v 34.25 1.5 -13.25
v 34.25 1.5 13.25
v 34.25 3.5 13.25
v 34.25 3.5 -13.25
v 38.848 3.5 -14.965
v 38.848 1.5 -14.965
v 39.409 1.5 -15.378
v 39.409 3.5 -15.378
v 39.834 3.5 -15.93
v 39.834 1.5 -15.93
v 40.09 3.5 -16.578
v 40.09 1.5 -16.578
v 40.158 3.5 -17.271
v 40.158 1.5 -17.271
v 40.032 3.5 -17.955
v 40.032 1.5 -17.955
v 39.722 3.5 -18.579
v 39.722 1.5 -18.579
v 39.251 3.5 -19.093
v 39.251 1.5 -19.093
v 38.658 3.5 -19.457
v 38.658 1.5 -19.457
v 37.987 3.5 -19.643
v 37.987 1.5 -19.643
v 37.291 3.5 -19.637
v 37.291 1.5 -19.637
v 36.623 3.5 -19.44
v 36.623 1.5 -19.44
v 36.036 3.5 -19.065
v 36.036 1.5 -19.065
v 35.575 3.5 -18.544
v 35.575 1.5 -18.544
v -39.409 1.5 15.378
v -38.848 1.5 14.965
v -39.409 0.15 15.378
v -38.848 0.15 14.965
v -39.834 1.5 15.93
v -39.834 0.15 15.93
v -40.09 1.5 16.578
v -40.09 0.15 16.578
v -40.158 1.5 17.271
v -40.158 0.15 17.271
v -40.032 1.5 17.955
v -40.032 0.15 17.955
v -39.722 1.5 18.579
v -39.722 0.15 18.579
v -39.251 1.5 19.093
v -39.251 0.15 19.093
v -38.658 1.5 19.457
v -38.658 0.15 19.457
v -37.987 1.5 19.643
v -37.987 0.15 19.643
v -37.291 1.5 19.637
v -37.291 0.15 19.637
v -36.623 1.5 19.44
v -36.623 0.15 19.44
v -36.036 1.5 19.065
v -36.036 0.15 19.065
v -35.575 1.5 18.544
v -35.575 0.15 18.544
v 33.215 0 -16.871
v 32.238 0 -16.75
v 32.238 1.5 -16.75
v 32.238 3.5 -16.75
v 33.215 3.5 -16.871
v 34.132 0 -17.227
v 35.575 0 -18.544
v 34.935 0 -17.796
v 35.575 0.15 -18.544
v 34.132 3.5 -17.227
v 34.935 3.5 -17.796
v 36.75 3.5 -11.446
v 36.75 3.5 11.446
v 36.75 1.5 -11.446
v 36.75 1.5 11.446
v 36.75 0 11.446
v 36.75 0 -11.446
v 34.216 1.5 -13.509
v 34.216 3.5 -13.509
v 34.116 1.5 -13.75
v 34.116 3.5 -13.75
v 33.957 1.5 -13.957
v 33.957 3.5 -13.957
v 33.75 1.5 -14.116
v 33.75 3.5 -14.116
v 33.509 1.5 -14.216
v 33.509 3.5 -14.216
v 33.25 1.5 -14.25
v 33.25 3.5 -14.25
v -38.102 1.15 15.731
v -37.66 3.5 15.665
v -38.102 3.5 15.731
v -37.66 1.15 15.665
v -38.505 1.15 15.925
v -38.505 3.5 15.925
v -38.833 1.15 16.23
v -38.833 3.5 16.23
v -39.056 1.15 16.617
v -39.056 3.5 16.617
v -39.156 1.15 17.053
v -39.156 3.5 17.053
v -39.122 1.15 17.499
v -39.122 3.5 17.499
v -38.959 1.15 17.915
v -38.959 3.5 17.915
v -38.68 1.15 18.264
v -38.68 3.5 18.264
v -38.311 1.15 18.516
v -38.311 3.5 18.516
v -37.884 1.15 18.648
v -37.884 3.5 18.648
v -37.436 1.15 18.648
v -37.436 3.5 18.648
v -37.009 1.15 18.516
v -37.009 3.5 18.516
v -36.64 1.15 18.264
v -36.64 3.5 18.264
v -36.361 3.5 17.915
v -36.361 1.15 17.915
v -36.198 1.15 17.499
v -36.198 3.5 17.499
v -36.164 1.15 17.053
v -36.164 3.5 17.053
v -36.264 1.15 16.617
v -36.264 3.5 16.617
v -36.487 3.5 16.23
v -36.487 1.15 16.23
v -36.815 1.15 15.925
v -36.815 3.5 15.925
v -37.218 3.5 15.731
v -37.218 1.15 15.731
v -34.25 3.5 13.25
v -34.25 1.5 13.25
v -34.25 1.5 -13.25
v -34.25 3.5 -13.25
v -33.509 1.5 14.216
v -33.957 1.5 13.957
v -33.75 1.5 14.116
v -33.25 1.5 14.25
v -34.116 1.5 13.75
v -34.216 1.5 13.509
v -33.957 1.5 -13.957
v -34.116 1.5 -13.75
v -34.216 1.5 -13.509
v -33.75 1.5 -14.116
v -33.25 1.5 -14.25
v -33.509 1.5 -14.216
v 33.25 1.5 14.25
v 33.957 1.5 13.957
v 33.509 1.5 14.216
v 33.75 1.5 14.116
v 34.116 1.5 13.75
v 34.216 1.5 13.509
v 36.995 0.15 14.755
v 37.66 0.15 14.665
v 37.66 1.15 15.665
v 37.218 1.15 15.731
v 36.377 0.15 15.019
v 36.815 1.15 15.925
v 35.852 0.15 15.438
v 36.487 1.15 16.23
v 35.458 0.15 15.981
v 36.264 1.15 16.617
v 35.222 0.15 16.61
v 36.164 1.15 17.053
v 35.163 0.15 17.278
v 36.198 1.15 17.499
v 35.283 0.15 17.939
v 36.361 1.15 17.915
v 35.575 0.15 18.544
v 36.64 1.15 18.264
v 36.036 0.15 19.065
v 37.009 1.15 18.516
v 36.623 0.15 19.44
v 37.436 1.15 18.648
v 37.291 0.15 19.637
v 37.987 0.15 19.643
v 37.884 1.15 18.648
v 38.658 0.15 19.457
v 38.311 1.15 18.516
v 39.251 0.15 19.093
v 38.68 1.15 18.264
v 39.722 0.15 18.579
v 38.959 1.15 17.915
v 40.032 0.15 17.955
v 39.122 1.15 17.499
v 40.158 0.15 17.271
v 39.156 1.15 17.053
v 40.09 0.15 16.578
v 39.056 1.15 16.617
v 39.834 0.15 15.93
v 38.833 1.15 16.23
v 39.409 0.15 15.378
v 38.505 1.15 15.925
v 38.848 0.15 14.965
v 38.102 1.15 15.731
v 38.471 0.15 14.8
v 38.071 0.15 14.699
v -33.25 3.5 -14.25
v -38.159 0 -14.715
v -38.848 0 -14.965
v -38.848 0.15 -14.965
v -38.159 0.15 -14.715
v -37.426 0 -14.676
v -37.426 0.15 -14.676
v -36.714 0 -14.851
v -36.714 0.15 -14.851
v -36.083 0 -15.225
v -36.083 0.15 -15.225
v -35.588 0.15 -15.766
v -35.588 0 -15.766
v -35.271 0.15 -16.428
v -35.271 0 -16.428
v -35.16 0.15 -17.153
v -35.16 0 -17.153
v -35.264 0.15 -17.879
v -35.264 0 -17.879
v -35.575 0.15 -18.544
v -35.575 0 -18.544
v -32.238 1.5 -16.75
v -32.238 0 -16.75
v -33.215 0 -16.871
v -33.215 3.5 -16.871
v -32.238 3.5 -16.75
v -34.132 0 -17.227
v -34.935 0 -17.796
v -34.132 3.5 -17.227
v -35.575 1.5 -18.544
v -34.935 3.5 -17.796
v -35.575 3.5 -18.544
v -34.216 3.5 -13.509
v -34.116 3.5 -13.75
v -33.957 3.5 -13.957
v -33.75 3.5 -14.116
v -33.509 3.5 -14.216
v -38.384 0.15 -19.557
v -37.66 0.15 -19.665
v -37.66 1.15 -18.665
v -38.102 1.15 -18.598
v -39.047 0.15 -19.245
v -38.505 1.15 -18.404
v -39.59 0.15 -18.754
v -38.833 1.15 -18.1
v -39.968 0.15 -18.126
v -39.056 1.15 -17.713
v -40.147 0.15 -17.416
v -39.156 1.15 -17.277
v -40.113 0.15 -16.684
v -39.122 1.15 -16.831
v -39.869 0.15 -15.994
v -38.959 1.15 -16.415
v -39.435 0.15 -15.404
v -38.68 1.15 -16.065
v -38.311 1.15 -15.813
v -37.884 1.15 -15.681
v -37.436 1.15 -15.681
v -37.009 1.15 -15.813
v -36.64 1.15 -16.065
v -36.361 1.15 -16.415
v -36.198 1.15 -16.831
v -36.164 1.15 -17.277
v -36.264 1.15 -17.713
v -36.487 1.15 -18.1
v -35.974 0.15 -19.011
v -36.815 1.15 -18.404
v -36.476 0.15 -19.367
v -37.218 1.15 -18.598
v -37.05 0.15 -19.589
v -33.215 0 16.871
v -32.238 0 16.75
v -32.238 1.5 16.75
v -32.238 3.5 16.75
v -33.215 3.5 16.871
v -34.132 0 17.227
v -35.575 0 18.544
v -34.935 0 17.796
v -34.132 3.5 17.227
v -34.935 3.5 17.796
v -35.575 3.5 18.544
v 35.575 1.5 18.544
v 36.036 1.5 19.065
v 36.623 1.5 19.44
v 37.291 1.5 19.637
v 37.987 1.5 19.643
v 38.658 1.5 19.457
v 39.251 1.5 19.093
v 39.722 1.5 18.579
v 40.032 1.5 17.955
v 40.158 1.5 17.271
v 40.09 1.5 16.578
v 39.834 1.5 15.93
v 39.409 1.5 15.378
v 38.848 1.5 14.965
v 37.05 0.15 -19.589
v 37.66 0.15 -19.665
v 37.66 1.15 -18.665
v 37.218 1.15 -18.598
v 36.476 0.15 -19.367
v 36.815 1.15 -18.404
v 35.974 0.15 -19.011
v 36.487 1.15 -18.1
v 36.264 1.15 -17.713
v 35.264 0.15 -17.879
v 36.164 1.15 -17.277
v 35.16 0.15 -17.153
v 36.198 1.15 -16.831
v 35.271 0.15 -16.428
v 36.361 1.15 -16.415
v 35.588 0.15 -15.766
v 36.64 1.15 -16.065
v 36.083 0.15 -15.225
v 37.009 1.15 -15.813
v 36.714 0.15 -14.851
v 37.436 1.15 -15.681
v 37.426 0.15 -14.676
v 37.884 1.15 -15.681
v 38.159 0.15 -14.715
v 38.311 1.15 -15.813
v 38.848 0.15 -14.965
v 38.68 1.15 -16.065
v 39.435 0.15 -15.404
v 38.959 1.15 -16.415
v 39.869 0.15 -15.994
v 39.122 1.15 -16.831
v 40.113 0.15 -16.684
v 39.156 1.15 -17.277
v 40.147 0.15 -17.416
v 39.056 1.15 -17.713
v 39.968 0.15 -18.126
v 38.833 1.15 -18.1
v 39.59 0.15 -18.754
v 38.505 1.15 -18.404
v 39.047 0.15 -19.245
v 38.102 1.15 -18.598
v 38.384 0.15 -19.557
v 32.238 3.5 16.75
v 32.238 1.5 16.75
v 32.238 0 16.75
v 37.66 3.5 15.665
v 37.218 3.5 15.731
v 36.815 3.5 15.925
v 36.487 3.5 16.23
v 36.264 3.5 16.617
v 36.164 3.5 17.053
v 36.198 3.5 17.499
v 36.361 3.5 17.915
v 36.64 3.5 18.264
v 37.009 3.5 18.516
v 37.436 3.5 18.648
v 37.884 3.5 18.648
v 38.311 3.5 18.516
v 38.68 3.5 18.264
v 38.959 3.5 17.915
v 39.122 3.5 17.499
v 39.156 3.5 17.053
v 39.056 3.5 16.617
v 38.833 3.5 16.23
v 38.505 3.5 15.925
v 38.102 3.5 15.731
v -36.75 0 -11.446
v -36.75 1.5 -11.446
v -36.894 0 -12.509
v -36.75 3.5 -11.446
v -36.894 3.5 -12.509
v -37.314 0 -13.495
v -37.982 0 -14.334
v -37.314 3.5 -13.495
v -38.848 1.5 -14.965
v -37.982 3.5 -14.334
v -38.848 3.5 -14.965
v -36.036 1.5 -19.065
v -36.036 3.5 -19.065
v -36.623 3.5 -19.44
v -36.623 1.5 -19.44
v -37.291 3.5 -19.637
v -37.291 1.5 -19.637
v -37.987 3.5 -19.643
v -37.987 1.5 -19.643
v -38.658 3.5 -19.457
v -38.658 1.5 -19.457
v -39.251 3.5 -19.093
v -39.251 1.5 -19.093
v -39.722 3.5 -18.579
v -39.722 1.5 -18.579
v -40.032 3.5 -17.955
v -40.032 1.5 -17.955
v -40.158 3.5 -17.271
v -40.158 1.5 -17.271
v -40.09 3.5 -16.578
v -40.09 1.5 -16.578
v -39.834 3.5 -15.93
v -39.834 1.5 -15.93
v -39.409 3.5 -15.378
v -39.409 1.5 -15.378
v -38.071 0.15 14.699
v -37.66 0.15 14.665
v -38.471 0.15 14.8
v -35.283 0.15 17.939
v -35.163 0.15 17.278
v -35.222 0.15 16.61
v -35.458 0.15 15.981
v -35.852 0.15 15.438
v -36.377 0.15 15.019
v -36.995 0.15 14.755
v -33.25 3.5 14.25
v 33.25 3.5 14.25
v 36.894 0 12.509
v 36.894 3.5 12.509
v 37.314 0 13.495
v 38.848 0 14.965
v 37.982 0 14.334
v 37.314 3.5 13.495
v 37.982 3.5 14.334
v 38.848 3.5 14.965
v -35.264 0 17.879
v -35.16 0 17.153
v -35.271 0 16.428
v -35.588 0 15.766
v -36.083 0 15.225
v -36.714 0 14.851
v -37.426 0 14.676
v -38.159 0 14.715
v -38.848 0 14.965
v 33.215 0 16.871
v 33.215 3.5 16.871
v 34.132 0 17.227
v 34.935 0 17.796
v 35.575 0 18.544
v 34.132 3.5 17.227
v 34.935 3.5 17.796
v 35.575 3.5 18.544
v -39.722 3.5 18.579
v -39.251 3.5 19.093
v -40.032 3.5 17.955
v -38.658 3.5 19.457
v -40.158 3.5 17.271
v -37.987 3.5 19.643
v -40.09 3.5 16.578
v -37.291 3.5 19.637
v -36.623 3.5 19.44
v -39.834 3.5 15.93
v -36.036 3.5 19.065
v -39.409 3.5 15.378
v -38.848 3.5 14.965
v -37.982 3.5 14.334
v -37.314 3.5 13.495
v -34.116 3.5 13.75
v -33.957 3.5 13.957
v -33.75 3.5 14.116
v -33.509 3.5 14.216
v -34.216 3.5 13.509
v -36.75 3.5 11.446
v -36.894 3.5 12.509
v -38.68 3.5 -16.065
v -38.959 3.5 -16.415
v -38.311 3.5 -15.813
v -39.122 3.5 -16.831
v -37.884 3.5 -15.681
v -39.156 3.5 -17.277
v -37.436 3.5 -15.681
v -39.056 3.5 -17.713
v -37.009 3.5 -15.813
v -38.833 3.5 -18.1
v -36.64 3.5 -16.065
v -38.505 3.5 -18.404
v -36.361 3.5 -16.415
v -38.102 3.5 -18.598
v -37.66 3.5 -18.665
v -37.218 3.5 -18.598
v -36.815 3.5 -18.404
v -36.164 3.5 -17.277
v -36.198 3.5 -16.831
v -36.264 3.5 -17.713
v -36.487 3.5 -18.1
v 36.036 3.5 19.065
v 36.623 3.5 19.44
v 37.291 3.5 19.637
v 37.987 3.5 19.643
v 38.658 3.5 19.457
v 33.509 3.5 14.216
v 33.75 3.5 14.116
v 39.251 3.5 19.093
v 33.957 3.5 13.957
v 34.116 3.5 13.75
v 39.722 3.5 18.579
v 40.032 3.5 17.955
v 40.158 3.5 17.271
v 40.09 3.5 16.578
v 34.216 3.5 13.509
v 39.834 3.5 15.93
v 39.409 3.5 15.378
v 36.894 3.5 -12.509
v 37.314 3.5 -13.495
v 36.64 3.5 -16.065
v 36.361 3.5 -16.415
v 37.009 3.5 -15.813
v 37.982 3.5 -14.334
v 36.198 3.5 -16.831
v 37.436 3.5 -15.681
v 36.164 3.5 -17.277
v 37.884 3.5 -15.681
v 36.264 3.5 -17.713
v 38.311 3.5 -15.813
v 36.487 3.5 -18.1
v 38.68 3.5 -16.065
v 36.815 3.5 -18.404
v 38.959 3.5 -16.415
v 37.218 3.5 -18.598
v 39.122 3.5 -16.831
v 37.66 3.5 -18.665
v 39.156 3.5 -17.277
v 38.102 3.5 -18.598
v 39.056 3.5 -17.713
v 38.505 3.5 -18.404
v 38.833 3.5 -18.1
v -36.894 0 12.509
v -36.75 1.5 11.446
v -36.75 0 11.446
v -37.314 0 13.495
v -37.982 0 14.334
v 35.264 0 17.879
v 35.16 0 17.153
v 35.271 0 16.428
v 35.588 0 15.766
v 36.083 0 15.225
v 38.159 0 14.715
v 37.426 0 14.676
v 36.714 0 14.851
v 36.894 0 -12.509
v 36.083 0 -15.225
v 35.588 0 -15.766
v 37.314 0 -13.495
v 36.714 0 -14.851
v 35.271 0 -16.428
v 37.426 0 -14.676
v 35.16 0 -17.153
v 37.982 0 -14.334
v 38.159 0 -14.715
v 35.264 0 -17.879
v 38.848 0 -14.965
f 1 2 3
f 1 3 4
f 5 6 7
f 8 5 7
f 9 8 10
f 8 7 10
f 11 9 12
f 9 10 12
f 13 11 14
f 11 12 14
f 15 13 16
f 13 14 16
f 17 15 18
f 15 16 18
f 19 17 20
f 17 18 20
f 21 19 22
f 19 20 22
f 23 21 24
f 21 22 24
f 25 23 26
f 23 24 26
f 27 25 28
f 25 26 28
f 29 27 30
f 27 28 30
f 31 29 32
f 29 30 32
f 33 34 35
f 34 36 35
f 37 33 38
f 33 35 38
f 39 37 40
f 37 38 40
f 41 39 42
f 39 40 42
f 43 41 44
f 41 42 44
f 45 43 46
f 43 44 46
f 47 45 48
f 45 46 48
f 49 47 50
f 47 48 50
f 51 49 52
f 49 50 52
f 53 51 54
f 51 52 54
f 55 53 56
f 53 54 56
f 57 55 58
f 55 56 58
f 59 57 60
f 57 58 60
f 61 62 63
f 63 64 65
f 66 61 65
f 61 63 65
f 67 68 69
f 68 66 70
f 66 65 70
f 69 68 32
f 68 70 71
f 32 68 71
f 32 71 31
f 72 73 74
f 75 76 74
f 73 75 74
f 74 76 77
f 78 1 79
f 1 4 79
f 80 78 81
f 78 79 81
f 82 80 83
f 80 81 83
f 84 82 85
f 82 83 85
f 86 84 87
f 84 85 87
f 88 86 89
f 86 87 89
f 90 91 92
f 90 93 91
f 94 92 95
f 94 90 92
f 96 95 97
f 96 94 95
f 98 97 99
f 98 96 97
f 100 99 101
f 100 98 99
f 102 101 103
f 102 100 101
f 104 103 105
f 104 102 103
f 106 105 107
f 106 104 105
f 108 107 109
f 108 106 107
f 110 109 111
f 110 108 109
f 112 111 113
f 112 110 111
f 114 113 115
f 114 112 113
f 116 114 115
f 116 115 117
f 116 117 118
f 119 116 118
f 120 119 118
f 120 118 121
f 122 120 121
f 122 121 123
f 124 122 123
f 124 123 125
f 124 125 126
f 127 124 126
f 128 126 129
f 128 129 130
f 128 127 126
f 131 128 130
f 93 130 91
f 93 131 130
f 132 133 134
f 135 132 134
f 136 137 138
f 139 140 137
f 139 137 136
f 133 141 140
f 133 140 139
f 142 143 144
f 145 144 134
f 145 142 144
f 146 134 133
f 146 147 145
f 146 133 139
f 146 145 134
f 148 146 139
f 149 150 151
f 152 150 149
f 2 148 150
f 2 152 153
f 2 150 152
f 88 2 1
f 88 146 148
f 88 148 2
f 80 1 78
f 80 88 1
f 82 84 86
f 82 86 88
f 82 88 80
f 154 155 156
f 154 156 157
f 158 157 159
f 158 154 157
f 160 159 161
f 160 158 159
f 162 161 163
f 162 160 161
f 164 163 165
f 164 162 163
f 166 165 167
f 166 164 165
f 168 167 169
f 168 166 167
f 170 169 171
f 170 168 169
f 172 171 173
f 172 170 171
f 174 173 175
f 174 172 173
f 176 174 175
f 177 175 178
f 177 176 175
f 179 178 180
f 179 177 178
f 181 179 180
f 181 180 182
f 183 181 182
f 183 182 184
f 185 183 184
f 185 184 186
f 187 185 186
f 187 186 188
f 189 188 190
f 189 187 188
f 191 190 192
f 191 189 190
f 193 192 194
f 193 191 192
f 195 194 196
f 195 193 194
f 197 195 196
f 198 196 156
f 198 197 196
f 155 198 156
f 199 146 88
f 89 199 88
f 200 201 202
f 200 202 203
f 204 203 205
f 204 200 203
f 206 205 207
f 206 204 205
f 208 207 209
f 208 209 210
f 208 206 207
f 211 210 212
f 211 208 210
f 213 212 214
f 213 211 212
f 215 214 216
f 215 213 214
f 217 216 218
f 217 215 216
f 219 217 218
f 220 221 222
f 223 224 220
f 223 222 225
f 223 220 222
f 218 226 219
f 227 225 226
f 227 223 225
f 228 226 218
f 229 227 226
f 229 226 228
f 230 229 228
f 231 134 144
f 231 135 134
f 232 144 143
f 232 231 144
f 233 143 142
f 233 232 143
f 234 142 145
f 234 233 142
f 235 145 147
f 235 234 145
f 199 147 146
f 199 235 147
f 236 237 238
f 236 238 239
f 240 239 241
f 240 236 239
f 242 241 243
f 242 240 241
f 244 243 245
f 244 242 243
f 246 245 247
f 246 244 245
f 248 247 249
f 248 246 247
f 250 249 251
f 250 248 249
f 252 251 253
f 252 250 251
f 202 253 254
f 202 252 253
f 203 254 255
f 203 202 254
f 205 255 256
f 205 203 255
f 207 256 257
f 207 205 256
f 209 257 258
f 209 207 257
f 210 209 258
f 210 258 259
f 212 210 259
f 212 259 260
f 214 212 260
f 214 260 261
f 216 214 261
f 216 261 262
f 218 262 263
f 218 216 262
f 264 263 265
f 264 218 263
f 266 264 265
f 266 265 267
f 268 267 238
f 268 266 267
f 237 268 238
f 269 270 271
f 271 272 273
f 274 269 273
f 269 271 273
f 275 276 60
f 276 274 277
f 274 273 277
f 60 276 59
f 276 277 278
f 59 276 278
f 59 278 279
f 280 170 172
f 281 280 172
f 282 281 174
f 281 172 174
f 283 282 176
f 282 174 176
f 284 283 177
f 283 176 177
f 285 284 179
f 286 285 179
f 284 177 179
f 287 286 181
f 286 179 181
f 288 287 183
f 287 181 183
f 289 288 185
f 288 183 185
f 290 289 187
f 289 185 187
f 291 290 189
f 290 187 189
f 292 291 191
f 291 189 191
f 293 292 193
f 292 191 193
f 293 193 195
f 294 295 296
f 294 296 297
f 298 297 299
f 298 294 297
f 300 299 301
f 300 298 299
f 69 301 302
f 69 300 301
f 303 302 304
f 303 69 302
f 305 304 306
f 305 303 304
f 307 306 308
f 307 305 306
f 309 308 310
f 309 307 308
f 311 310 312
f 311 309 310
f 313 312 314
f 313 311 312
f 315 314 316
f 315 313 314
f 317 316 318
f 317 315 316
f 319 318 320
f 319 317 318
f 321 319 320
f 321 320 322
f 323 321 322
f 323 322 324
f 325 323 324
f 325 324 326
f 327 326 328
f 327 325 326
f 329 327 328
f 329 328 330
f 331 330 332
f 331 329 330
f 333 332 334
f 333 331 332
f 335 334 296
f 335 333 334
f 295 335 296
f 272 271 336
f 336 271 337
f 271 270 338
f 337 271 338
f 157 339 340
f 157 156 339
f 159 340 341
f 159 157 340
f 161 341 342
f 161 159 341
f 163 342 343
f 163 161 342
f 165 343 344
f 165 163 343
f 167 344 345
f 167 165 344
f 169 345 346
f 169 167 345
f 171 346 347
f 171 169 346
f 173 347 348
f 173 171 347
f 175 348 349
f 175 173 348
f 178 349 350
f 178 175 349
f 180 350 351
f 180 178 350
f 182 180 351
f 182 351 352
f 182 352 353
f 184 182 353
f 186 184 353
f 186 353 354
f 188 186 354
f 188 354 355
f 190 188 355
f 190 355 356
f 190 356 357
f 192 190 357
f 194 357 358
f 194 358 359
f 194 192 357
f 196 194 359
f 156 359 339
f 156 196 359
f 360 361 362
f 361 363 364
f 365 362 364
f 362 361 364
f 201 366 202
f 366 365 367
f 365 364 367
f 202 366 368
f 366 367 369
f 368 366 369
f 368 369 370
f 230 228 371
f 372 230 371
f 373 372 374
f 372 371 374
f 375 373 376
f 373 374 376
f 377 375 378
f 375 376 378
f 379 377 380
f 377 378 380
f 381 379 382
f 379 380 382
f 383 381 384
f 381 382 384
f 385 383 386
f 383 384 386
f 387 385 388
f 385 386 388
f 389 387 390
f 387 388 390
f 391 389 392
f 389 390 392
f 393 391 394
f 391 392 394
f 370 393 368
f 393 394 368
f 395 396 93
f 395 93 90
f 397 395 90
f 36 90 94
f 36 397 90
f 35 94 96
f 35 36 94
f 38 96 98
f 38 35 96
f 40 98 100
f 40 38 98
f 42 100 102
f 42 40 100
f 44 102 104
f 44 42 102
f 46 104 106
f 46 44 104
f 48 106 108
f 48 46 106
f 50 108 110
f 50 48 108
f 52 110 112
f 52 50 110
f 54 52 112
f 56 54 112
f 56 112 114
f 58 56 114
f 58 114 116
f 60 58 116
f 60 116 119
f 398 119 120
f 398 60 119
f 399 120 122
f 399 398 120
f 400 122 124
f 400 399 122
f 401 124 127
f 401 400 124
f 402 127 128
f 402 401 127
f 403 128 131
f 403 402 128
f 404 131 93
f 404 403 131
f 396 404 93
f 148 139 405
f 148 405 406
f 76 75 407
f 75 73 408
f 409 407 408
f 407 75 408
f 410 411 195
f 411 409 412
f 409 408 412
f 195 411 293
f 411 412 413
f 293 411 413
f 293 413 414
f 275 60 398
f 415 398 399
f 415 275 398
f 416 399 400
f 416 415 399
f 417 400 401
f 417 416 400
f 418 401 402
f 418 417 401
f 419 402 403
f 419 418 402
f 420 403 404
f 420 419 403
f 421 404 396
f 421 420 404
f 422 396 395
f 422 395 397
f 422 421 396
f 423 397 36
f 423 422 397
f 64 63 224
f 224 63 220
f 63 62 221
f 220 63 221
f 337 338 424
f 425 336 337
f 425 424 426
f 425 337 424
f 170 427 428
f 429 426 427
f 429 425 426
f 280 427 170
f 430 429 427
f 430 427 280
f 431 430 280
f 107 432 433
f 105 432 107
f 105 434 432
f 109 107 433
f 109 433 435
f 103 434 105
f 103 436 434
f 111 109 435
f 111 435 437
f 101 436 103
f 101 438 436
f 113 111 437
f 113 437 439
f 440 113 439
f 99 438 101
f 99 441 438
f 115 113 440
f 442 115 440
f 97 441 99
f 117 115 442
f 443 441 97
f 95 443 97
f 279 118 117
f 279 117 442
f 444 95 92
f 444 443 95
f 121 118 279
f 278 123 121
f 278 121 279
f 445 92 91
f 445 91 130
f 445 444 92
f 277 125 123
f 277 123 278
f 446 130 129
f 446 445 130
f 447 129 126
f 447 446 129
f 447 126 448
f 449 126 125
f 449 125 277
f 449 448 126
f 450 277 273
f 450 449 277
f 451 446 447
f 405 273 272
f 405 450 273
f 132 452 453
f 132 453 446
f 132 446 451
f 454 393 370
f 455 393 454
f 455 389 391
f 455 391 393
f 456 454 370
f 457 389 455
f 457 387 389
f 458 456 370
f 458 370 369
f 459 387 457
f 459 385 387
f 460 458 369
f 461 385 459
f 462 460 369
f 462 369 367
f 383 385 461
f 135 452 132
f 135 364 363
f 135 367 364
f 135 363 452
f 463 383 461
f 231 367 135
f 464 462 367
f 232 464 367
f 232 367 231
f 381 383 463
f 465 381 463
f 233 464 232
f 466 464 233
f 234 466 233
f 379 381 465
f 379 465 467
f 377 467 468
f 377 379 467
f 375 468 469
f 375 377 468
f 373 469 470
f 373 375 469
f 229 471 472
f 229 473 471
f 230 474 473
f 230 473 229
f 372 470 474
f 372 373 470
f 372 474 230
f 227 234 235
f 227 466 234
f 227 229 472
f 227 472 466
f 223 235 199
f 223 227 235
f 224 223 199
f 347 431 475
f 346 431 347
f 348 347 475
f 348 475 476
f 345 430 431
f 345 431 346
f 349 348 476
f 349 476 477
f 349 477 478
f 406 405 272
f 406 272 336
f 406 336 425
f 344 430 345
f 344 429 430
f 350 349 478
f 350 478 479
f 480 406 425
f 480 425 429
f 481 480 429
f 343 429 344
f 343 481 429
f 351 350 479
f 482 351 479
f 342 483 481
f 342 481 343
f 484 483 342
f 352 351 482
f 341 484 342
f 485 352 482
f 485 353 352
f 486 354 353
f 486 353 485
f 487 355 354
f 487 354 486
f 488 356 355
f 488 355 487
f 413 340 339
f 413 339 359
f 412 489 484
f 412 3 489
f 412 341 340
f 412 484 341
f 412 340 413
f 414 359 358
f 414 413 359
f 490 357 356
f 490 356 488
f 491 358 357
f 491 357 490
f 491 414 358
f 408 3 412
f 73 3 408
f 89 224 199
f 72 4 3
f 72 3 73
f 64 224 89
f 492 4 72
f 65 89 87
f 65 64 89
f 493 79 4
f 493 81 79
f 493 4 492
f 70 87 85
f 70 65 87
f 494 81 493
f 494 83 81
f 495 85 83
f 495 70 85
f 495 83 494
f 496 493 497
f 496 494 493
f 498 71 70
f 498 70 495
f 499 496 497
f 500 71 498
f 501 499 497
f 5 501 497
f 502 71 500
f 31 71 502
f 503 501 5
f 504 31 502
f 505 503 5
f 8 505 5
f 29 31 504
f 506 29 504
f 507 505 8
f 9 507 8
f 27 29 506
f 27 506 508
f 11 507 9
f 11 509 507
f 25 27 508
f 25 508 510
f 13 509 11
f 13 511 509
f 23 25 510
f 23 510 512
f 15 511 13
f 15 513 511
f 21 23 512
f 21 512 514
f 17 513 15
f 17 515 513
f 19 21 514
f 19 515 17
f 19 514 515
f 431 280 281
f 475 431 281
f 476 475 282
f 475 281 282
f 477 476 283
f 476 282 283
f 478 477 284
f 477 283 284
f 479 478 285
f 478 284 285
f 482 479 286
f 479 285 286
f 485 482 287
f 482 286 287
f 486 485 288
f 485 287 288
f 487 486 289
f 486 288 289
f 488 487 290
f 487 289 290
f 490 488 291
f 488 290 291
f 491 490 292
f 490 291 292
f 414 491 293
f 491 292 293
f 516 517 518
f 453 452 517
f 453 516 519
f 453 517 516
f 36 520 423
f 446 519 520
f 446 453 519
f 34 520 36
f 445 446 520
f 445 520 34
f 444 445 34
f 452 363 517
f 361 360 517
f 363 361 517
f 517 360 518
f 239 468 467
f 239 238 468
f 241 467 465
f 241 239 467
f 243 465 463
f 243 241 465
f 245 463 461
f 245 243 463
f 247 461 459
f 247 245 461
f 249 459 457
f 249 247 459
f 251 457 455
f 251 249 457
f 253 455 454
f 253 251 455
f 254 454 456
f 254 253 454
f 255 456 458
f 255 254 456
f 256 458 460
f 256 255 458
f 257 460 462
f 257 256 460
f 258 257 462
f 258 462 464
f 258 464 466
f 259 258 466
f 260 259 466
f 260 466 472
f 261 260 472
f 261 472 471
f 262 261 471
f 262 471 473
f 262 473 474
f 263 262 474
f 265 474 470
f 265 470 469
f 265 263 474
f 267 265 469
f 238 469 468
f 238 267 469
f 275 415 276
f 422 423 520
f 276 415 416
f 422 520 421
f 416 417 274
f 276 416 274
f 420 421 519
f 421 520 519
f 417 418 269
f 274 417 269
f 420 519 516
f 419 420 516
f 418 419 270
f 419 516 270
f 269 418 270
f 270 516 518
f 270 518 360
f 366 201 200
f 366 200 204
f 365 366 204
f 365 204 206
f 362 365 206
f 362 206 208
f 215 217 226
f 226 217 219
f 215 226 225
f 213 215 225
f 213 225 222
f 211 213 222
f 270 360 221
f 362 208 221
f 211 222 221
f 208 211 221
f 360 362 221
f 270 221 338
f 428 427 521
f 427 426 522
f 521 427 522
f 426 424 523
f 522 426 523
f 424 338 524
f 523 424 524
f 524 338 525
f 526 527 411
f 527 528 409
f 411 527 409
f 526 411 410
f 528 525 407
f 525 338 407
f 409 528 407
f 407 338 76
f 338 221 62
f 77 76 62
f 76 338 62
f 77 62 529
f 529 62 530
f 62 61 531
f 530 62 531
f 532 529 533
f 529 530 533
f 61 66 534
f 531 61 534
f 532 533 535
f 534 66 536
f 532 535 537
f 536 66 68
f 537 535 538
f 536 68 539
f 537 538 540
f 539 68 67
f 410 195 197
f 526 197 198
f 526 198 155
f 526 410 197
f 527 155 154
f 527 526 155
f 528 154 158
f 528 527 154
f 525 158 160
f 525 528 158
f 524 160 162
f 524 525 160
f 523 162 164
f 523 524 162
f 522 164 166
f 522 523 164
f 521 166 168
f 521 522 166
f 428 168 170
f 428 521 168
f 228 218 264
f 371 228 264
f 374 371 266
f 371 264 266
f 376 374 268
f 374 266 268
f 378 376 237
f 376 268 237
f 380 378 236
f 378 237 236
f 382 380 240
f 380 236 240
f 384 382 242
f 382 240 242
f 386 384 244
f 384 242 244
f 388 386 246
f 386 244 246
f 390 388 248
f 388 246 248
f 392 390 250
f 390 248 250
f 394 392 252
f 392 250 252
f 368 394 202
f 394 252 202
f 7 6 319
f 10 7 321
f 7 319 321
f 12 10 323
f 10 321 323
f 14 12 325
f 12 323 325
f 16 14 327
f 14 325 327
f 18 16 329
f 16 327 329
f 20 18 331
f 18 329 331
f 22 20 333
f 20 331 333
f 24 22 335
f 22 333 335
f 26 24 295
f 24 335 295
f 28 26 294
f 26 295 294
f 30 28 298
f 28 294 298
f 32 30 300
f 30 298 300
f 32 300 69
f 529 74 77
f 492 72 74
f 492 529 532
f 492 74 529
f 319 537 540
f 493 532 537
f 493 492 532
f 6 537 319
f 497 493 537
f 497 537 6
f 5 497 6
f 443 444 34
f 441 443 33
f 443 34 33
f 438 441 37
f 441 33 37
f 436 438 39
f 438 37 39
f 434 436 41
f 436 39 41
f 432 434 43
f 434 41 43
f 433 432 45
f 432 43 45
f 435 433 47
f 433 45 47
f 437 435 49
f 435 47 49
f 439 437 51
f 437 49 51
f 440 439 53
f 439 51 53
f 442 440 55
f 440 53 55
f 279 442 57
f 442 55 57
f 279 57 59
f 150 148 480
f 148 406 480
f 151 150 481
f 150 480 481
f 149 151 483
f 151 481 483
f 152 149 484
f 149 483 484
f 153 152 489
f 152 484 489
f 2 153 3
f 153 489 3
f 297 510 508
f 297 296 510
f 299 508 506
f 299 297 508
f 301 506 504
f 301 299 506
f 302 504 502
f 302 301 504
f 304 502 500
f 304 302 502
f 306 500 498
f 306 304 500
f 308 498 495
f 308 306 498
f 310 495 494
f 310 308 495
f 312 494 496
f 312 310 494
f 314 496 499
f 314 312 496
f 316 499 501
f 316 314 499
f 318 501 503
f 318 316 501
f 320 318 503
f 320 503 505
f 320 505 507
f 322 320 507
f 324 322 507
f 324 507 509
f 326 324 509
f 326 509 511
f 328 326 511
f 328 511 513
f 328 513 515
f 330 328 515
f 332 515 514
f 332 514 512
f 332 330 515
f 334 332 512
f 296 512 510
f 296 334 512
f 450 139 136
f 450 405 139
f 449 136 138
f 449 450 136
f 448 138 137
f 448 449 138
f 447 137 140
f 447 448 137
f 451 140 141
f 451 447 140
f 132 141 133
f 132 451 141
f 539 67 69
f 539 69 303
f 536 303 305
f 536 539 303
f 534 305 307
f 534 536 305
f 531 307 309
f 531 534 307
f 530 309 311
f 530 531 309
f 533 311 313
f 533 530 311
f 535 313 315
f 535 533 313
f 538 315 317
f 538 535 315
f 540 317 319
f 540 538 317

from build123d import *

# Parameters (mm, degrees)
SKETCH1_R                                      = 2.5
SKETCH1_R_2                                    = 1
SKETCH1_W                                      = 73.5
SKETCH1_H                                      = 33.5
BOSS_EXTRUDE1_DEPTH                            = 1.5
SKETCH2_R                                      = 1
SKETCH2_W                                      = 68.5
SKETCH2_H                                      = 28.5
BOSS_EXTRUDE2_DEPTH                            = 2
FILLET1_R                                      = 4
CSK_FOR_M2_5_FLAT_HEAD_MACHINE_SCREW1_AT_COUNT = 2
CSK_FOR_M2_5_FLAT_HEAD_MACHINE_SCREW1_AT_PITCH = 34.329470958
CSK_FOR_M2_5_FLAT_HEAD_MACHINE_SCREW_2_COUNT   = 2
CSK_FOR_M2_5_FLAT_HEAD_MACHINE_SCREW_2_PITCH   = 75.319884043
CSK_FOR_M2_5_FLAT_HEAD_MACHINE_SCREW_3_COUNT   = 2
CSK_FOR_M2_5_FLAT_HEAD_MACHINE_SCREW_3_PITCH   = 82.774377125
FILLET2_R                                      = 1


with BuildPart() as part:
    # Sketch1 → Boss-Extrude1 (new body)
    # profile 1 of 5: a face of its own
    with BuildSketch(Plane(origin=(0, 0, 0), x_dir=(1, 0, 0), z_dir=(0, 1, 0))):
        with Locations((-37.659942021, 17.164735479)):
            Circle(SKETCH1_R)
        with Locations(Location((-37.659942021, 17.164735479, 0), (0, 0, 270))):
            Circle(SKETCH1_R_2, mode=Mode.SUBTRACT)
    # profile 2 of 5: a face of its own
    with BuildSketch(Plane(origin=(0, 0, 0), x_dir=(1, 0, 0), z_dir=(0, 1, 0))):
        with Locations((37.659942021, 17.164735479)):
            Circle(SKETCH1_R)
        with Locations(Location((37.659942021, 17.164735479, 0), (0, 0, 270))):
            Circle(SKETCH1_R_2, mode=Mode.SUBTRACT)
    # profile 3 of 5: a face of its own
    with BuildSketch(Plane(origin=(0, 0, 0), x_dir=(1, 0, 0), z_dir=(0, 1, 0))):
        with Locations((37.659942021, -17.164735479)):
            Circle(SKETCH1_R)
        with Locations(Location((37.659942021, -17.164735479, 0), (0, 0, 270))):
            Circle(SKETCH1_R_2, mode=Mode.SUBTRACT)
    # profile 4 of 5: a face of its own
    with BuildSketch(Plane(origin=(0, 0, 0), x_dir=(1, 0, 0), z_dir=(0, 1, 0))):
        with Locations((-37.659942021, -17.164735479)):
            Circle(SKETCH1_R)
        with Locations(Location((-37.659942021, -17.164735479, 0), (0, 0, 270))):
            Circle(SKETCH1_R_2, mode=Mode.SUBTRACT)
    # profile 5 of 5: a face of its own
    with BuildSketch(Plane(origin=(0, 0, 0), x_dir=(1, 0, 0), z_dir=(0, 1, 0))):
        Rectangle(SKETCH1_W, SKETCH1_H)
    extrude(amount=BOSS_EXTRUDE1_DEPTH)

    # Sketch2 → Boss-Extrude2 (add)
    with BuildSketch(Plane(origin=(0, 1.5, 0), x_dir=(1, 0, 0), z_dir=(0, 1, 0))):
        with BuildLine():
            Line((36.75, -14.836215452), (36.75, 14.836215452))
            ThreePointArc((36.75, 14.836215452), (39.599995344, 18.741502141), (35.194583126, 16.75))
            Line((35.194583126, 16.75), (-35.194583126, 16.75))
            ThreePointArc((-35.194583126, 16.75), (-39.599995344, 18.741502141), (-36.75, 14.836215452))
            Line((-36.75, 14.836215452), (-36.75, -14.836215452))
            ThreePointArc((-36.75, -14.836215452), (-39.599995344, -18.741502141), (-35.194583126, -16.75))
            Line((-35.194583126, -16.75), (35.194583126, -16.75))
            ThreePointArc((35.194583126, -16.75), (39.599995344, -18.741502141), (36.75, -14.836215452))
        make_face()
        with Locations(Location((37.659942021, -17.164735479, 0), (0, 0, 270))):
            Circle(SKETCH2_R, mode=Mode.SUBTRACT)
        with Locations(Location((37.659942021, 17.164735479, 0), (0, 0, 270))):
            Circle(SKETCH2_R, mode=Mode.SUBTRACT)
        with Locations(Location((-37.659942021, 17.164735479, 0), (0, 0, 270))):
            Circle(SKETCH2_R, mode=Mode.SUBTRACT)
        with Locations(Location((-37.659942021, -17.164735479, 0), (0, 0, 270))):
            Circle(SKETCH2_R, mode=Mode.SUBTRACT)
        Rectangle(SKETCH2_W, SKETCH2_H, mode=Mode.SUBTRACT)
    extrude(amount=BOSS_EXTRUDE2_DEPTH)

    # Fillet1
    fillet1_edges = [part.edges().sort_by_distance(p)[0] for p in [
        (36.75, 1.75, 14.836215452),
        (35.194583126, 1.75, 16.75),
        (-35.194583126, 1.75, 16.75),
        (-36.75, 1.75, 14.836215452),
        (-36.75, 1.75, -14.836215452),
        (-35.194583126, 1.75, -16.75),
        (35.194583126, 1.75, -16.75),
        (36.75, 1.75, -14.836215452),
    ]]
    fillet(fillet1_edges, radius=FILLET1_R)

    # Sketch6 → CSK for M2.5 Flat Head Machine Screw1 (revolve, cut)
    with BuildSketch(Plane(origin=(-37.659942021, 0, 17.164735479), x_dir=(0, 0, -1), z_dir=(1, 0, 0))):
        Polygon((0, 0), (0, 3.5), (1.5, 3.5), (1.5, 1.15), (2.5, 0.15), (2.5, 0), align=None)
    csk_for_m2_5_flat_head_machine_screw1 = revolve(axis=Axis((-37.659942021, -6.35, 17.164735479), (0, 1, 0)), mode=Mode.SUBTRACT)

    # CSK for M2.5 Flat Head Machine Screw1 at: CSK for M2.5 Flat Head Machine Screw1 ×2
    with Locations(*[(0, 0, -i * CSK_FOR_M2_5_FLAT_HEAD_MACHINE_SCREW1_AT_PITCH) for i in range(1, CSK_FOR_M2_5_FLAT_HEAD_MACHINE_SCREW1_AT_COUNT)]):
        add(csk_for_m2_5_flat_head_machine_screw1, mode=Mode.SUBTRACT)

    # CSK for M2.5 Flat Head Machine Screw 2: CSK for M2.5 Flat Head Machine Screw1 ×2
    with Locations(*[(i * CSK_FOR_M2_5_FLAT_HEAD_MACHINE_SCREW_2_PITCH, 0, 0) for i in range(1, CSK_FOR_M2_5_FLAT_HEAD_MACHINE_SCREW_2_COUNT)]):
        add(csk_for_m2_5_flat_head_machine_screw1, mode=Mode.SUBTRACT)

    # CSK for M2.5 Flat Head Machine Screw 3: CSK for M2.5 Flat Head Machine Screw1 ×2
    with Locations(*[Vector(0.9099420214144476, 0, -0.4147354791480819) * (i * CSK_FOR_M2_5_FLAT_HEAD_MACHINE_SCREW_3_PITCH) for i in range(1, CSK_FOR_M2_5_FLAT_HEAD_MACHINE_SCREW_3_COUNT)]):
        add(csk_for_m2_5_flat_head_machine_screw1, mode=Mode.SUBTRACT)

    # Fillet2
    fillet2_edges = [part.edges().sort_by_distance(p)[0] for p in [
        (34.25, 2.5, 14.25),
        (34.25, 2.5, -14.25),
        (-34.25, 2.5, -14.25),
        (-34.25, 2.5, 14.25),
    ]]
    fillet(fillet2_edges, radius=FILLET2_R)


solid = part.part
